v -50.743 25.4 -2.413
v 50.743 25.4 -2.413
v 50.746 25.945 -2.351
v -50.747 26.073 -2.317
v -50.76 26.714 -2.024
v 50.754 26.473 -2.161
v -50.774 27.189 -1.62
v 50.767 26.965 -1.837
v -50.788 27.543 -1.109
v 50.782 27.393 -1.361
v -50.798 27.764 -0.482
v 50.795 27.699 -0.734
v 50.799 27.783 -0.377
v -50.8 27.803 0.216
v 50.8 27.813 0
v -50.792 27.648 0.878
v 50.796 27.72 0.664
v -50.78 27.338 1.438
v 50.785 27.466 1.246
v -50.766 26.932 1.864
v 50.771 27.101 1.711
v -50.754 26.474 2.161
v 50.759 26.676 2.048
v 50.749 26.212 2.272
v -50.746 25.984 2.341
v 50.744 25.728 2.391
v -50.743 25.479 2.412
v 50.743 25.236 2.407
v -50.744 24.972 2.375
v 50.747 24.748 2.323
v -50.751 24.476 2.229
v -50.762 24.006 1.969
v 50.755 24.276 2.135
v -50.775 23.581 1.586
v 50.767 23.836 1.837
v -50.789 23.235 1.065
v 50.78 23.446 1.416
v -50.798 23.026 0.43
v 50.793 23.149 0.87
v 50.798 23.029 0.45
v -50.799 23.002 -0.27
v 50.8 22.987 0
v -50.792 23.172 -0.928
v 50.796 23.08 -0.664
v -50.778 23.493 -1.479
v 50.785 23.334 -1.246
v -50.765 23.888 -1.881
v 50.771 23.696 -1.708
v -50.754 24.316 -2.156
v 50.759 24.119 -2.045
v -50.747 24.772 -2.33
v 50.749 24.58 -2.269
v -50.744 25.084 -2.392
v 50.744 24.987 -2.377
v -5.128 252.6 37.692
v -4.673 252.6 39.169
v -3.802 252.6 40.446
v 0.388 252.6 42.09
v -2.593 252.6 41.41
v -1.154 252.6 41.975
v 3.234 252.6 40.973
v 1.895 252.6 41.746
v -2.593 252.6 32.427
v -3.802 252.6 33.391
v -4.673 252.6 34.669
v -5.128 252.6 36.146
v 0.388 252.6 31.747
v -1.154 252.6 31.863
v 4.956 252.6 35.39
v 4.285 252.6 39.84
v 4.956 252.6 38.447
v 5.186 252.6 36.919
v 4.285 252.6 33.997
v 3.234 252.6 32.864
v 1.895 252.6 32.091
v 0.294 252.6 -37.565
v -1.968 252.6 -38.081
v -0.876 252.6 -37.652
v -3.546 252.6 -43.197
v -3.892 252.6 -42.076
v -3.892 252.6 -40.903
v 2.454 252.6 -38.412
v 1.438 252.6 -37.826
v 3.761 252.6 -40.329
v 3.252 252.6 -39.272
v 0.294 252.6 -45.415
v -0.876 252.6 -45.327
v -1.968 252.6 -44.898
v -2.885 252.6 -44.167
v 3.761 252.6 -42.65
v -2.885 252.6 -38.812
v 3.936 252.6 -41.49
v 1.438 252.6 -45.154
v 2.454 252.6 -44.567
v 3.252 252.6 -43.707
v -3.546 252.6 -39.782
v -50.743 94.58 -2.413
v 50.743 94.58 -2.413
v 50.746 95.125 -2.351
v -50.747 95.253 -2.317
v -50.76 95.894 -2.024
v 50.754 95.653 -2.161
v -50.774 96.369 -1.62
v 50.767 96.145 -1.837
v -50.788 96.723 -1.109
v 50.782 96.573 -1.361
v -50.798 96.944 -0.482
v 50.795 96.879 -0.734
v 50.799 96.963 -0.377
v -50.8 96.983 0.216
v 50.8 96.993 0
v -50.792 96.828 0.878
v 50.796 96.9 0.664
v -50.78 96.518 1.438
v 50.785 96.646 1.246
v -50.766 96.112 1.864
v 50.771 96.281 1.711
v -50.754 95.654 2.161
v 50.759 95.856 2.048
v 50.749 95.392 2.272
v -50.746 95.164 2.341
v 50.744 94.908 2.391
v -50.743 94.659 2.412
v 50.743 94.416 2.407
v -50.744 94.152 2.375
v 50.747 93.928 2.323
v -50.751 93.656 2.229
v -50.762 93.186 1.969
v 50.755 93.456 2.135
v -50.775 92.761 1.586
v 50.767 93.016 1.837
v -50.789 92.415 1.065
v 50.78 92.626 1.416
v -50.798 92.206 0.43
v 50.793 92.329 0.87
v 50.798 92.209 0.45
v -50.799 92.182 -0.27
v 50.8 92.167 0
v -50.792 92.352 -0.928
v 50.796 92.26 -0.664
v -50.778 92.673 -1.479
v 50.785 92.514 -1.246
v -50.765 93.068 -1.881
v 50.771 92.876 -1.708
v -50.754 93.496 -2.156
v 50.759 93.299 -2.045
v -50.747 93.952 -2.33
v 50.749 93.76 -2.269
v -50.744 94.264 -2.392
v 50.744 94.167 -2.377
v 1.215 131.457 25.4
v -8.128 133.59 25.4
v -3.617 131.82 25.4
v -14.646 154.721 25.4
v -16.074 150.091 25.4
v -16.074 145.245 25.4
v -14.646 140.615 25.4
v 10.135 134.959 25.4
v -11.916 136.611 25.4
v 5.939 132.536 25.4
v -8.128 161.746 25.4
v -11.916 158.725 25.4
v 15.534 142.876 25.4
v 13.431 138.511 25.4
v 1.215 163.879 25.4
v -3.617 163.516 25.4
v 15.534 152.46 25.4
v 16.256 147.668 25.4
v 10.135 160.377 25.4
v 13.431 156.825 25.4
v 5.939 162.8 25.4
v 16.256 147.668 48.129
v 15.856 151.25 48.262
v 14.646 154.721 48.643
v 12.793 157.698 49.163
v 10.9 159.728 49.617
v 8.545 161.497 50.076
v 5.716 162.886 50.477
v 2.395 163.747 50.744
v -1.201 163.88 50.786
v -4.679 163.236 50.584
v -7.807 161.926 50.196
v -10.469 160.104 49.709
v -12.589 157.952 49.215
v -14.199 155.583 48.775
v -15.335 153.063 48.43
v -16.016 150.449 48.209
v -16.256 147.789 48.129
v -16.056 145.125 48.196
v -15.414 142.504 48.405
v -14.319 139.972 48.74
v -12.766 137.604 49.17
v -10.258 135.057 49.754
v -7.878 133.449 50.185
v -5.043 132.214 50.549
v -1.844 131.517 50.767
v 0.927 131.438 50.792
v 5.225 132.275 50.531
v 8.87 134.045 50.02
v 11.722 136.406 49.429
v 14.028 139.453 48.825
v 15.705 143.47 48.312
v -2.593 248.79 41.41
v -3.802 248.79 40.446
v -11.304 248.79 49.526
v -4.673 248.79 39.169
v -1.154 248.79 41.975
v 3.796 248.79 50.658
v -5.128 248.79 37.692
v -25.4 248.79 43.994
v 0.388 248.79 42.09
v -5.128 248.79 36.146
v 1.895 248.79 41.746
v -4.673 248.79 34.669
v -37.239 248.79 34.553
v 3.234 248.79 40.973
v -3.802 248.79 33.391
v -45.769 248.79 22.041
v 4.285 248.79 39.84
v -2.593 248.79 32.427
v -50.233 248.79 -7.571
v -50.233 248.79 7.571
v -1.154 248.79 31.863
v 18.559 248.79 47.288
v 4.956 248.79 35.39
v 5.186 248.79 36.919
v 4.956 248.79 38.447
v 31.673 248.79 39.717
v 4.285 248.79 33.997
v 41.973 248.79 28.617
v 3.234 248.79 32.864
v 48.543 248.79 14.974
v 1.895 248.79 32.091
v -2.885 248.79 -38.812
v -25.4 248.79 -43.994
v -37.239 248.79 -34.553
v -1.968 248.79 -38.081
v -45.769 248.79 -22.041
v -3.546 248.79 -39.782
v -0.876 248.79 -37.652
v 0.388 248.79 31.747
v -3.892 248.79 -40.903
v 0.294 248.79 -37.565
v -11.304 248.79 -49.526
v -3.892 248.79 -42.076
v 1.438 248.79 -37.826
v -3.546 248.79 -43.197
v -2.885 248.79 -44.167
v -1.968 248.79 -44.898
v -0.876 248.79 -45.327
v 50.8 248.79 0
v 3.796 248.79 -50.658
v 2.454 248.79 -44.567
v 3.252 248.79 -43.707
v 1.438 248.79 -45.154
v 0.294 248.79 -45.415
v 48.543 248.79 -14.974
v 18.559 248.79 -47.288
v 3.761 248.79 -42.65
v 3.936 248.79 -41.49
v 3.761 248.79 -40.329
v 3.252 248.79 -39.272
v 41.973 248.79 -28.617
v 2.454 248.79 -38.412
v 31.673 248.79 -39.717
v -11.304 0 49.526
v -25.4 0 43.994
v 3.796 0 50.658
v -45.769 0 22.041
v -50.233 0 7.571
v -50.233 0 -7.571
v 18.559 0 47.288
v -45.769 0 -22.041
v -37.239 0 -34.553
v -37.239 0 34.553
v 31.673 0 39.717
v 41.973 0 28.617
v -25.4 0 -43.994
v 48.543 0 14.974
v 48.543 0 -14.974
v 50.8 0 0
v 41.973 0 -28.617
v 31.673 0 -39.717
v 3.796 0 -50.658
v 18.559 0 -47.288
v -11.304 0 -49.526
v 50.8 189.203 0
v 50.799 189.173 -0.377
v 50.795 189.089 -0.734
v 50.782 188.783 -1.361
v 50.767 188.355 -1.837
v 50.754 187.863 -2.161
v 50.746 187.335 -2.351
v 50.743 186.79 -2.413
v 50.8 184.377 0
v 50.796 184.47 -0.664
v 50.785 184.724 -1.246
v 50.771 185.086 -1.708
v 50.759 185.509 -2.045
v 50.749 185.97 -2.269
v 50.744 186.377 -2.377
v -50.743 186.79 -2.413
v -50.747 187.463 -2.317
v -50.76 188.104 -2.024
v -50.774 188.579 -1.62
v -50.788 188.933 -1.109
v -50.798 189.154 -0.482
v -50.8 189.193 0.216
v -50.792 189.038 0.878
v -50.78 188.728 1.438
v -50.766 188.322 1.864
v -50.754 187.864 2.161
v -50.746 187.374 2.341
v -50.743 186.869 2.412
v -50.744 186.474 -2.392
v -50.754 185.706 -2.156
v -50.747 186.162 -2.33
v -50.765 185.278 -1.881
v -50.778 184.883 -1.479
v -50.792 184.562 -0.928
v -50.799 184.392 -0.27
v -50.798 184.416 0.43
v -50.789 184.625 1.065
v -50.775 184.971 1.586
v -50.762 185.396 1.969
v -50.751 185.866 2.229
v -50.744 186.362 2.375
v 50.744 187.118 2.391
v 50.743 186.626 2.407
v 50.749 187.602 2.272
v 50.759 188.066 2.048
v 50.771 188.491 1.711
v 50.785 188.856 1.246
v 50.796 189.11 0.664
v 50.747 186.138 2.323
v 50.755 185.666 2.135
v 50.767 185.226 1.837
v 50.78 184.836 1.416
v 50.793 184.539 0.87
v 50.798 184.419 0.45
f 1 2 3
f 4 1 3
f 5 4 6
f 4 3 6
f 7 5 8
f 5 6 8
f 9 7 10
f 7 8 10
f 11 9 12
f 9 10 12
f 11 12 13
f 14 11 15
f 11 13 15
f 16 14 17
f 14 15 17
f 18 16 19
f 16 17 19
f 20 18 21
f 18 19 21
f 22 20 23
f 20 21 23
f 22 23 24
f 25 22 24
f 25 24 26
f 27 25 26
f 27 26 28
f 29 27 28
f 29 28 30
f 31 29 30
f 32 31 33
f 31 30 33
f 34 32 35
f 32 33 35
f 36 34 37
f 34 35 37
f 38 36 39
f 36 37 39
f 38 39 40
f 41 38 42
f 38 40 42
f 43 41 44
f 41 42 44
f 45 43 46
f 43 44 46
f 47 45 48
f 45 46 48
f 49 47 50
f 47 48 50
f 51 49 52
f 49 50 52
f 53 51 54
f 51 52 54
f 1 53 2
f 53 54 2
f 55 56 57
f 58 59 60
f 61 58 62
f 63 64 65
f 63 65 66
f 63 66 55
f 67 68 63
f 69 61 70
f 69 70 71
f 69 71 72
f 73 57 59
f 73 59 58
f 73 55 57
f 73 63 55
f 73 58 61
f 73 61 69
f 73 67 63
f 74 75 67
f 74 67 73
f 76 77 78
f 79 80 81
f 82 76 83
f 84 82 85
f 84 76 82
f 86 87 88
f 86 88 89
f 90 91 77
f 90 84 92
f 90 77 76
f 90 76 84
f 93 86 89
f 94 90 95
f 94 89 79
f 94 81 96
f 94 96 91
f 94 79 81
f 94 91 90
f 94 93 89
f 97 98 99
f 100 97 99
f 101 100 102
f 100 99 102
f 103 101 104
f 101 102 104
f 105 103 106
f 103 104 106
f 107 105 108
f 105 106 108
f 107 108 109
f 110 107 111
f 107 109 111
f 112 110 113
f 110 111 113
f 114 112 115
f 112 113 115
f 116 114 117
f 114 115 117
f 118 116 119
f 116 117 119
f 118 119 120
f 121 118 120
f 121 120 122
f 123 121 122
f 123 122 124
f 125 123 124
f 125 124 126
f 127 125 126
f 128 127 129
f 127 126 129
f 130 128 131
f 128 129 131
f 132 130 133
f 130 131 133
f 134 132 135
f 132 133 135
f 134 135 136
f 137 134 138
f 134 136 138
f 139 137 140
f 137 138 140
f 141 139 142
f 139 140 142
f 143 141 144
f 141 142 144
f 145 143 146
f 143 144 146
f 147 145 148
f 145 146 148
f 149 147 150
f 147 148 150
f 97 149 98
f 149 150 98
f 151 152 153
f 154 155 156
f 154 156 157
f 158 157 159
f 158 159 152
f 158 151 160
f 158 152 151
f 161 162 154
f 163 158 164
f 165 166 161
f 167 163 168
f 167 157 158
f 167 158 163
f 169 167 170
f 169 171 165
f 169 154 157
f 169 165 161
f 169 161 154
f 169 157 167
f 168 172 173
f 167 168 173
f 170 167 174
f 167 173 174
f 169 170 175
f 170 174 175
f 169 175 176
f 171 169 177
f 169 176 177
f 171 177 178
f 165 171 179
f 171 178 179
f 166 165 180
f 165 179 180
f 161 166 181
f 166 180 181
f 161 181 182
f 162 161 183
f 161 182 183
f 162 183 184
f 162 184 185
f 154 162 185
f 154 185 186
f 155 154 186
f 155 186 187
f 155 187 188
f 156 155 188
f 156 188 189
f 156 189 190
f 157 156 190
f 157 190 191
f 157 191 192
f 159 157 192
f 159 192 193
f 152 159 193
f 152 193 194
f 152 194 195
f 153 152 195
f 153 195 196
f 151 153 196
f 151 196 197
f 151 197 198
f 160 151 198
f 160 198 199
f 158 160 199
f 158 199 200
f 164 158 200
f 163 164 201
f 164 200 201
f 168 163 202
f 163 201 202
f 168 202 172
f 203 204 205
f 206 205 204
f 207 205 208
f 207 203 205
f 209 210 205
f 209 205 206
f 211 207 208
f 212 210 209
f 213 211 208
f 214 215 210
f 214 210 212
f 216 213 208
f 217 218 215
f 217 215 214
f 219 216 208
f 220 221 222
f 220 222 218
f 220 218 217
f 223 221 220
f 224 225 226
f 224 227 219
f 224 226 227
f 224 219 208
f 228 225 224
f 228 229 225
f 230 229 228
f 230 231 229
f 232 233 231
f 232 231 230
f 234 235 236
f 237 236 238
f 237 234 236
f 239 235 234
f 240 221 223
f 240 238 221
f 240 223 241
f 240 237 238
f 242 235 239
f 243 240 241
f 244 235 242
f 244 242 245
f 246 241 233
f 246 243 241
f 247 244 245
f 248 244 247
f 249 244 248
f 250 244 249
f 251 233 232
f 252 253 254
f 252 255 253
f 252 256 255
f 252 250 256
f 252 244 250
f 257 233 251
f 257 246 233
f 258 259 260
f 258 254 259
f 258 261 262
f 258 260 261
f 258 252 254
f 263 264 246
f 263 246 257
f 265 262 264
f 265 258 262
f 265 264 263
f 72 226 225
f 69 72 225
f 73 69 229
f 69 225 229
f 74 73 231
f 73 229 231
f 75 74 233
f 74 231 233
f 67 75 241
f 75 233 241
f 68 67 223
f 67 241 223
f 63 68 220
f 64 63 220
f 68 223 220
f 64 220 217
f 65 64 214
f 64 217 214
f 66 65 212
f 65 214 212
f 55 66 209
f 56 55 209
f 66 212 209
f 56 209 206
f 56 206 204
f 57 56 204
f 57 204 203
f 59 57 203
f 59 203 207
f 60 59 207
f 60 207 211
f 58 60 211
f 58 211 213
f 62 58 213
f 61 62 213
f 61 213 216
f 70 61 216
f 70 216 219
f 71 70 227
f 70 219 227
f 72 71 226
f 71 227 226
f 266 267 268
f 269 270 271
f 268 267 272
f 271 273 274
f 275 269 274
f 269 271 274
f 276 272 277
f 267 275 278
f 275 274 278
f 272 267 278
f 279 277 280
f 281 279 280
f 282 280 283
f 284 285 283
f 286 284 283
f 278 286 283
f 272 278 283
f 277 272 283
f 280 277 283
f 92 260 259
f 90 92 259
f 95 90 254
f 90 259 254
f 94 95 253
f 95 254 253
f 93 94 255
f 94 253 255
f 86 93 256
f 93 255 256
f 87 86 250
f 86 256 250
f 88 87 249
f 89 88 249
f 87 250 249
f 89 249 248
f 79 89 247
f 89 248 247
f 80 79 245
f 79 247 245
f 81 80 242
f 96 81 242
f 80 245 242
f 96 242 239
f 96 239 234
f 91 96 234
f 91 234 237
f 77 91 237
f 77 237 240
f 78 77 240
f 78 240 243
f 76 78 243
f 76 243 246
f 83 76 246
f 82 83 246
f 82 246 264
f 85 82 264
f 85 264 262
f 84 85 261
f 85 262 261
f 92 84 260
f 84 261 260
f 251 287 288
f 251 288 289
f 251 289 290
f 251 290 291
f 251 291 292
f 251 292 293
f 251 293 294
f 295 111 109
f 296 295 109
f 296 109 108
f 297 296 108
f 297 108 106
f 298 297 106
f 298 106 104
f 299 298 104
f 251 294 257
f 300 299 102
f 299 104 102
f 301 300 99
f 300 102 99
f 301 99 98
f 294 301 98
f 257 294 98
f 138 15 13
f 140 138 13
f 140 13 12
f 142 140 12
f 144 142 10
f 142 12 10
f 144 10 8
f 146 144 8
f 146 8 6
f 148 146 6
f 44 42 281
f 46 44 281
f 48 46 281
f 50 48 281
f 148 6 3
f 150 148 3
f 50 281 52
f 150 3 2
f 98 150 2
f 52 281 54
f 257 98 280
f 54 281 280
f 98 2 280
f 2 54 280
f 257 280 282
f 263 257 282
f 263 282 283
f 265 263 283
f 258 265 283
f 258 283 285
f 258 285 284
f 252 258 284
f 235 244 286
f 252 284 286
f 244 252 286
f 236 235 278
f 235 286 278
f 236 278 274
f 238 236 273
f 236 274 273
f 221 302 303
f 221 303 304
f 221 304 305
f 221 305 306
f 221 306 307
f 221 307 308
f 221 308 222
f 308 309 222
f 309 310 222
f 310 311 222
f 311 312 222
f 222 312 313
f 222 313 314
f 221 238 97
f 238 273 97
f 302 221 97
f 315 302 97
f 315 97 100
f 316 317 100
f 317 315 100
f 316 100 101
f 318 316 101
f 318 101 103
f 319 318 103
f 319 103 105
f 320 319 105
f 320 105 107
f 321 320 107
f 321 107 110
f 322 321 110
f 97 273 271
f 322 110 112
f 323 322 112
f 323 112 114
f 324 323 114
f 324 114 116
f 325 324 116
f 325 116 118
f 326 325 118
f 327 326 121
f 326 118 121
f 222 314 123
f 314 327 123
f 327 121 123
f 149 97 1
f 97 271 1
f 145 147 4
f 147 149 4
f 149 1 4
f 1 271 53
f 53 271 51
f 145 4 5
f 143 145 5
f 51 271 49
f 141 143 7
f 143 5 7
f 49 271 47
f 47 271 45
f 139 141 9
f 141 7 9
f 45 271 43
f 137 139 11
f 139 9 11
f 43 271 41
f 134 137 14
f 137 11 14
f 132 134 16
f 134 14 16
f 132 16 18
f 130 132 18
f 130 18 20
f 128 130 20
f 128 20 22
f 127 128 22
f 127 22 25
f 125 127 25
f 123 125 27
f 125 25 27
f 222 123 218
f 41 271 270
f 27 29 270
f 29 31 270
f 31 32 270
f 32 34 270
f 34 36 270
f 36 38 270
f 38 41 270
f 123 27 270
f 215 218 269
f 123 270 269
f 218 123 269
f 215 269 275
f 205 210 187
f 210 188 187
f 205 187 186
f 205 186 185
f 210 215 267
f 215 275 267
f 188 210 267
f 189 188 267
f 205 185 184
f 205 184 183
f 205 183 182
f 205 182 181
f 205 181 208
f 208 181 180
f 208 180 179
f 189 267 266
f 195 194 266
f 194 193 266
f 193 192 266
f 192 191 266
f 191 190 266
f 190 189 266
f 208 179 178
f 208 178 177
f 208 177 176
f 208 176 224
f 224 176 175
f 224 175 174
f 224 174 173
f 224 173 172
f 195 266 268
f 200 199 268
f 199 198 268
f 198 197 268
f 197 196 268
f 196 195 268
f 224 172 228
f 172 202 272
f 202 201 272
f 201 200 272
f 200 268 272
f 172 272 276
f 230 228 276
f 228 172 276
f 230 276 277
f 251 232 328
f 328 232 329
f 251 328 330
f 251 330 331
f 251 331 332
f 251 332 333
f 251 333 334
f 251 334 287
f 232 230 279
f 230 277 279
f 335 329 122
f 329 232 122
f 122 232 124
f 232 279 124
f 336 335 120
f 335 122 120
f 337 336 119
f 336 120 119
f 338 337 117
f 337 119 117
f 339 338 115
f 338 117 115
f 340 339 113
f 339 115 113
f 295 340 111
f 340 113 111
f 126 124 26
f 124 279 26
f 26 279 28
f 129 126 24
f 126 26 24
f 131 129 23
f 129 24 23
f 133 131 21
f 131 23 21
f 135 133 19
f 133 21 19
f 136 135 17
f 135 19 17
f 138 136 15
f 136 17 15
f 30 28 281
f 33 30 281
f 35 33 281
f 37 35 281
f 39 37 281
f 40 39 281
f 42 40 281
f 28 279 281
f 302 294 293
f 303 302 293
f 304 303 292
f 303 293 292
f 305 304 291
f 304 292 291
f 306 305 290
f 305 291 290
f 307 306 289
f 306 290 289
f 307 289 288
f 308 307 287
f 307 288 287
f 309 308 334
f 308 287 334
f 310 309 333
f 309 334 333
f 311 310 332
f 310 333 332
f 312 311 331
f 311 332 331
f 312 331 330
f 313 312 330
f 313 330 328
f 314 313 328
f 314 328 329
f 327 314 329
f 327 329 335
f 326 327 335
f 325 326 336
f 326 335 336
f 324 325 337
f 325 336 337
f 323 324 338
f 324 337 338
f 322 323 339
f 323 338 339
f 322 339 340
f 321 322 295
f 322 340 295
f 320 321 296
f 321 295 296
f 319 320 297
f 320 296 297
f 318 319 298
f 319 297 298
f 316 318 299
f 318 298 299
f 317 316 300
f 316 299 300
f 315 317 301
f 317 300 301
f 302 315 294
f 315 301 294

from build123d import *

# Parameters (mm, degrees)
SKETCH1_R           = 50.8
BOSS_EXTRUDE1_DEPTH = 248.79
SKETCH3_R           = 16.256
CUT_EXTRUDE1_DEPTH  = 25.4
SKETCH4_R           = 2.413
CUT_EXTRUDE2_DEPTH  = 102.6000001
SKETCH5_R           = 3.935994996
SKETCH5_R_2         = 5.186201194
BOSS_EXTRUDE2_DEPTH = 3.81


with BuildPart() as part:
    # Sketch1 → Boss-Extrude1 (new body)
    with BuildSketch(Plane(origin=(0, 0, 0), x_dir=(1, 0, 0), z_dir=(0, 1, 0))):
        Circle(SKETCH1_R)
    extrude(amount=BOSS_EXTRUDE1_DEPTH)

    # Sketch3 → Cut-Extrude1 (cut)
    with BuildSketch(Plane.XY.offset(50.8)):
        with Locations((0, 147.668)):
            Circle(SKETCH3_R)
    extrude(amount=-CUT_EXTRUDE1_DEPTH, mode=Mode.SUBTRACT)

    # Sketch4 → Cut-Extrude2 (cut, through all)
    with BuildSketch(Plane(origin=(50.8, 0, 0), x_dir=(0, 0, -1), z_dir=(1, 0, 0))):
        with Locations((0, 186.79)):
            Circle(SKETCH4_R)
        with Locations((0, 94.58)):
            Circle(SKETCH4_R)
        with Locations((0, 25.4)):
            Circle(SKETCH4_R)
    extrude(amount=-CUT_EXTRUDE2_DEPTH, mode=Mode.SUBTRACT)

    # Sketch5 → Boss-Extrude2 (add)
    with BuildSketch(Plane(origin=(0, 248.79, 0), x_dir=(1, 0, 0), z_dir=(0, 1, 0))):
        with Locations((0, 41.48960955)):
            Circle(SKETCH5_R)
        with Locations((0, -36.918720362)):
            Circle(SKETCH5_R_2)
    extrude(amount=BOSS_EXTRUDE2_DEPTH)


solid = part.part
